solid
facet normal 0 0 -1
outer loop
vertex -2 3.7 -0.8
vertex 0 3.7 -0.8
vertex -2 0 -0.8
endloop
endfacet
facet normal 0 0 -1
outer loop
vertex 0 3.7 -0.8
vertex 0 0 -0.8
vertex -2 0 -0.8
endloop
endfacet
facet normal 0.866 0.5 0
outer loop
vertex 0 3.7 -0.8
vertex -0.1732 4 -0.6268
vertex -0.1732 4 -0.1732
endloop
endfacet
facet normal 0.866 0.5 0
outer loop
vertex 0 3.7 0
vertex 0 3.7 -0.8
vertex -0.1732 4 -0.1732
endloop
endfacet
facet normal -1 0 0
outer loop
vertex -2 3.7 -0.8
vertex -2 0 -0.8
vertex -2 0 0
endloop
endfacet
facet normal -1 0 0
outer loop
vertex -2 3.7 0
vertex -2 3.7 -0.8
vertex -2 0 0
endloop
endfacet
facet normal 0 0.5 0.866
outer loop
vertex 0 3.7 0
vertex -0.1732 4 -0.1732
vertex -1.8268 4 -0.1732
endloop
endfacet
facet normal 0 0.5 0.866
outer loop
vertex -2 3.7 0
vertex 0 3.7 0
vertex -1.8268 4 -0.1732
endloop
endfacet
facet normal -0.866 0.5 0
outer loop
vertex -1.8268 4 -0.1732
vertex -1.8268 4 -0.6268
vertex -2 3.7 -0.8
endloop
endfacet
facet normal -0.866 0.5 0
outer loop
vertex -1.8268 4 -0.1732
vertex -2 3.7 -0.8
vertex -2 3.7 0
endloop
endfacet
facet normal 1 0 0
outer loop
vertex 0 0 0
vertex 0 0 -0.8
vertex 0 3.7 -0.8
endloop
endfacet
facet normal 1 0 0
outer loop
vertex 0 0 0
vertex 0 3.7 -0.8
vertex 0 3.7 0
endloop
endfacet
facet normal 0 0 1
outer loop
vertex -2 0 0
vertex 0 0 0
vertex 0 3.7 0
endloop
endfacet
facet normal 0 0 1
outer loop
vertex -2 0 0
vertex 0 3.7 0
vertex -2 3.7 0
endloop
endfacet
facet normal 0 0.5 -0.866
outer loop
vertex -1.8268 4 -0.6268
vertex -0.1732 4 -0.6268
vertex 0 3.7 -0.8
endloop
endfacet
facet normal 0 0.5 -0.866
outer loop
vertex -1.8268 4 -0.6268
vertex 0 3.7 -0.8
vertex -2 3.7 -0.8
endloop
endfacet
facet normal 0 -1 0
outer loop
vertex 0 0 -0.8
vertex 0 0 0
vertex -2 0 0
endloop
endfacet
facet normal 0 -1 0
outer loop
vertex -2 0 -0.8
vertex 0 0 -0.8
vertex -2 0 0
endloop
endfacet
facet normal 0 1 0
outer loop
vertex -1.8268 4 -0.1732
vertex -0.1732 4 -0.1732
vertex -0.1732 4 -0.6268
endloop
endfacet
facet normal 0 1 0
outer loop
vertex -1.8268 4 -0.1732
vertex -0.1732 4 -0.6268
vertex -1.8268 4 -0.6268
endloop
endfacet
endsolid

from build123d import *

# Parameters (mm, degrees)
SKETCH1_W             = 2
SKETCH1_H             = 0.8
BOSS_EXTRUDE1_DEPTH   = 4
CHAMFER1_SIZE         = 0.3
CHAMFER1_SIZE2        = 0.173205081
CHAMFER1_PART_2_SIZE  = 0.3
CHAMFER1_PART_2_SIZE2 = 0.173205081
CHAMFER1_PART_3_SIZE  = 0.3
CHAMFER1_PART_3_SIZE2 = 0.173205081
CHAMFER1_PART_4_SIZE  = 0.3
CHAMFER1_PART_4_SIZE2 = 0.173205081


with BuildPart() as part:
    # Sketch1 → Boss-Extrude1 (new body)
    with BuildSketch(Plane(origin=(0, 0, 0), x_dir=(-1, 0, 0), z_dir=(0, 1, 0))):
        with Locations((1, -0.4)):
            Rectangle(SKETCH1_W, SKETCH1_H)
    extrude(amount=BOSS_EXTRUDE1_DEPTH)

    # Chamfer1
    chamfer1_edges = [part.edges().sort_by_distance(p)[0] for p in [
        (-2, 4, -0.4),
    ]]
    chamfer1_side = [part.faces().sort_by_distance(p)[0] for p in [
        (-2, 2, -0.4),
    ]]
    chamfer(chamfer1_edges, length=CHAMFER1_SIZE, length2=CHAMFER1_SIZE2, reference=chamfer1_side[0])

    # Chamfer1 part 2
    chamfer1_part_2_edges = [part.edges().sort_by_distance(p)[0] for p in [
        (-1, 4, 0),
    ]]
    chamfer1_part_2_side = [part.faces().sort_by_distance(p)[0] for p in [
        (-1, 2, 0),
    ]]
    chamfer(chamfer1_part_2_edges, length=CHAMFER1_PART_2_SIZE, length2=CHAMFER1_PART_2_SIZE2, reference=chamfer1_part_2_side[0])

    # Chamfer1 part 3
    chamfer1_part_3_edges = [part.edges().sort_by_distance(p)[0] for p in [
        (0, 4, -0.4),
    ]]
    chamfer1_part_3_side = [part.faces().sort_by_distance(p)[0] for p in [
        (0, 2, -0.4),
    ]]
    chamfer(chamfer1_part_3_edges, length=CHAMFER1_PART_3_SIZE, length2=CHAMFER1_PART_3_SIZE2, reference=chamfer1_part_3_side[0])

    # Chamfer1 part 4
    chamfer1_part_4_edges = [part.edges().sort_by_distance(p)[0] for p in [
        (-1, 4, -0.8),
    ]]
    chamfer1_part_4_side = [part.faces().sort_by_distance(p)[0] for p in [
        (-1, 2, -0.8),
    ]]
    chamfer(chamfer1_part_4_edges, length=CHAMFER1_PART_4_SIZE, length2=CHAMFER1_PART_4_SIZE2, reference=chamfer1_part_4_side[0])


solid = part.part
